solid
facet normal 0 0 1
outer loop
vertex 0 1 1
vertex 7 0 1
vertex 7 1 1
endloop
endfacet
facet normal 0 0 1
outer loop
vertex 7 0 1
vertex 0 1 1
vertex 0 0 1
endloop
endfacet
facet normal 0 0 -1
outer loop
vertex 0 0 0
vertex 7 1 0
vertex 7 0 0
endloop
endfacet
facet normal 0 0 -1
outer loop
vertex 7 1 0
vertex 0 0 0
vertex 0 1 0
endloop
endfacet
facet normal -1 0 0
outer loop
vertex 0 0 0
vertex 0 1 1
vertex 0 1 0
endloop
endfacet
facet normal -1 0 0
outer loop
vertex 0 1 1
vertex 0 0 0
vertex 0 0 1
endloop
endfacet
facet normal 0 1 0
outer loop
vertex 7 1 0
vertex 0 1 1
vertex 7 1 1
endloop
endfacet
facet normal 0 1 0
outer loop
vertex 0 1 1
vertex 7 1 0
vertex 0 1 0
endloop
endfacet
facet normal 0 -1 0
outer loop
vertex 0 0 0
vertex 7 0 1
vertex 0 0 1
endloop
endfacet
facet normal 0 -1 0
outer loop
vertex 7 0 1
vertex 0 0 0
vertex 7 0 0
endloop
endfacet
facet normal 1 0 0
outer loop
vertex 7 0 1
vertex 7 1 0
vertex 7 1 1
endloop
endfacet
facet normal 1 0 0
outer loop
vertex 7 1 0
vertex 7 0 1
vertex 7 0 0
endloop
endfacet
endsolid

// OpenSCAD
for (i = [0:0.5:3]) translate([i * 2, 0, 0]) cube([1, 1, 1]);
